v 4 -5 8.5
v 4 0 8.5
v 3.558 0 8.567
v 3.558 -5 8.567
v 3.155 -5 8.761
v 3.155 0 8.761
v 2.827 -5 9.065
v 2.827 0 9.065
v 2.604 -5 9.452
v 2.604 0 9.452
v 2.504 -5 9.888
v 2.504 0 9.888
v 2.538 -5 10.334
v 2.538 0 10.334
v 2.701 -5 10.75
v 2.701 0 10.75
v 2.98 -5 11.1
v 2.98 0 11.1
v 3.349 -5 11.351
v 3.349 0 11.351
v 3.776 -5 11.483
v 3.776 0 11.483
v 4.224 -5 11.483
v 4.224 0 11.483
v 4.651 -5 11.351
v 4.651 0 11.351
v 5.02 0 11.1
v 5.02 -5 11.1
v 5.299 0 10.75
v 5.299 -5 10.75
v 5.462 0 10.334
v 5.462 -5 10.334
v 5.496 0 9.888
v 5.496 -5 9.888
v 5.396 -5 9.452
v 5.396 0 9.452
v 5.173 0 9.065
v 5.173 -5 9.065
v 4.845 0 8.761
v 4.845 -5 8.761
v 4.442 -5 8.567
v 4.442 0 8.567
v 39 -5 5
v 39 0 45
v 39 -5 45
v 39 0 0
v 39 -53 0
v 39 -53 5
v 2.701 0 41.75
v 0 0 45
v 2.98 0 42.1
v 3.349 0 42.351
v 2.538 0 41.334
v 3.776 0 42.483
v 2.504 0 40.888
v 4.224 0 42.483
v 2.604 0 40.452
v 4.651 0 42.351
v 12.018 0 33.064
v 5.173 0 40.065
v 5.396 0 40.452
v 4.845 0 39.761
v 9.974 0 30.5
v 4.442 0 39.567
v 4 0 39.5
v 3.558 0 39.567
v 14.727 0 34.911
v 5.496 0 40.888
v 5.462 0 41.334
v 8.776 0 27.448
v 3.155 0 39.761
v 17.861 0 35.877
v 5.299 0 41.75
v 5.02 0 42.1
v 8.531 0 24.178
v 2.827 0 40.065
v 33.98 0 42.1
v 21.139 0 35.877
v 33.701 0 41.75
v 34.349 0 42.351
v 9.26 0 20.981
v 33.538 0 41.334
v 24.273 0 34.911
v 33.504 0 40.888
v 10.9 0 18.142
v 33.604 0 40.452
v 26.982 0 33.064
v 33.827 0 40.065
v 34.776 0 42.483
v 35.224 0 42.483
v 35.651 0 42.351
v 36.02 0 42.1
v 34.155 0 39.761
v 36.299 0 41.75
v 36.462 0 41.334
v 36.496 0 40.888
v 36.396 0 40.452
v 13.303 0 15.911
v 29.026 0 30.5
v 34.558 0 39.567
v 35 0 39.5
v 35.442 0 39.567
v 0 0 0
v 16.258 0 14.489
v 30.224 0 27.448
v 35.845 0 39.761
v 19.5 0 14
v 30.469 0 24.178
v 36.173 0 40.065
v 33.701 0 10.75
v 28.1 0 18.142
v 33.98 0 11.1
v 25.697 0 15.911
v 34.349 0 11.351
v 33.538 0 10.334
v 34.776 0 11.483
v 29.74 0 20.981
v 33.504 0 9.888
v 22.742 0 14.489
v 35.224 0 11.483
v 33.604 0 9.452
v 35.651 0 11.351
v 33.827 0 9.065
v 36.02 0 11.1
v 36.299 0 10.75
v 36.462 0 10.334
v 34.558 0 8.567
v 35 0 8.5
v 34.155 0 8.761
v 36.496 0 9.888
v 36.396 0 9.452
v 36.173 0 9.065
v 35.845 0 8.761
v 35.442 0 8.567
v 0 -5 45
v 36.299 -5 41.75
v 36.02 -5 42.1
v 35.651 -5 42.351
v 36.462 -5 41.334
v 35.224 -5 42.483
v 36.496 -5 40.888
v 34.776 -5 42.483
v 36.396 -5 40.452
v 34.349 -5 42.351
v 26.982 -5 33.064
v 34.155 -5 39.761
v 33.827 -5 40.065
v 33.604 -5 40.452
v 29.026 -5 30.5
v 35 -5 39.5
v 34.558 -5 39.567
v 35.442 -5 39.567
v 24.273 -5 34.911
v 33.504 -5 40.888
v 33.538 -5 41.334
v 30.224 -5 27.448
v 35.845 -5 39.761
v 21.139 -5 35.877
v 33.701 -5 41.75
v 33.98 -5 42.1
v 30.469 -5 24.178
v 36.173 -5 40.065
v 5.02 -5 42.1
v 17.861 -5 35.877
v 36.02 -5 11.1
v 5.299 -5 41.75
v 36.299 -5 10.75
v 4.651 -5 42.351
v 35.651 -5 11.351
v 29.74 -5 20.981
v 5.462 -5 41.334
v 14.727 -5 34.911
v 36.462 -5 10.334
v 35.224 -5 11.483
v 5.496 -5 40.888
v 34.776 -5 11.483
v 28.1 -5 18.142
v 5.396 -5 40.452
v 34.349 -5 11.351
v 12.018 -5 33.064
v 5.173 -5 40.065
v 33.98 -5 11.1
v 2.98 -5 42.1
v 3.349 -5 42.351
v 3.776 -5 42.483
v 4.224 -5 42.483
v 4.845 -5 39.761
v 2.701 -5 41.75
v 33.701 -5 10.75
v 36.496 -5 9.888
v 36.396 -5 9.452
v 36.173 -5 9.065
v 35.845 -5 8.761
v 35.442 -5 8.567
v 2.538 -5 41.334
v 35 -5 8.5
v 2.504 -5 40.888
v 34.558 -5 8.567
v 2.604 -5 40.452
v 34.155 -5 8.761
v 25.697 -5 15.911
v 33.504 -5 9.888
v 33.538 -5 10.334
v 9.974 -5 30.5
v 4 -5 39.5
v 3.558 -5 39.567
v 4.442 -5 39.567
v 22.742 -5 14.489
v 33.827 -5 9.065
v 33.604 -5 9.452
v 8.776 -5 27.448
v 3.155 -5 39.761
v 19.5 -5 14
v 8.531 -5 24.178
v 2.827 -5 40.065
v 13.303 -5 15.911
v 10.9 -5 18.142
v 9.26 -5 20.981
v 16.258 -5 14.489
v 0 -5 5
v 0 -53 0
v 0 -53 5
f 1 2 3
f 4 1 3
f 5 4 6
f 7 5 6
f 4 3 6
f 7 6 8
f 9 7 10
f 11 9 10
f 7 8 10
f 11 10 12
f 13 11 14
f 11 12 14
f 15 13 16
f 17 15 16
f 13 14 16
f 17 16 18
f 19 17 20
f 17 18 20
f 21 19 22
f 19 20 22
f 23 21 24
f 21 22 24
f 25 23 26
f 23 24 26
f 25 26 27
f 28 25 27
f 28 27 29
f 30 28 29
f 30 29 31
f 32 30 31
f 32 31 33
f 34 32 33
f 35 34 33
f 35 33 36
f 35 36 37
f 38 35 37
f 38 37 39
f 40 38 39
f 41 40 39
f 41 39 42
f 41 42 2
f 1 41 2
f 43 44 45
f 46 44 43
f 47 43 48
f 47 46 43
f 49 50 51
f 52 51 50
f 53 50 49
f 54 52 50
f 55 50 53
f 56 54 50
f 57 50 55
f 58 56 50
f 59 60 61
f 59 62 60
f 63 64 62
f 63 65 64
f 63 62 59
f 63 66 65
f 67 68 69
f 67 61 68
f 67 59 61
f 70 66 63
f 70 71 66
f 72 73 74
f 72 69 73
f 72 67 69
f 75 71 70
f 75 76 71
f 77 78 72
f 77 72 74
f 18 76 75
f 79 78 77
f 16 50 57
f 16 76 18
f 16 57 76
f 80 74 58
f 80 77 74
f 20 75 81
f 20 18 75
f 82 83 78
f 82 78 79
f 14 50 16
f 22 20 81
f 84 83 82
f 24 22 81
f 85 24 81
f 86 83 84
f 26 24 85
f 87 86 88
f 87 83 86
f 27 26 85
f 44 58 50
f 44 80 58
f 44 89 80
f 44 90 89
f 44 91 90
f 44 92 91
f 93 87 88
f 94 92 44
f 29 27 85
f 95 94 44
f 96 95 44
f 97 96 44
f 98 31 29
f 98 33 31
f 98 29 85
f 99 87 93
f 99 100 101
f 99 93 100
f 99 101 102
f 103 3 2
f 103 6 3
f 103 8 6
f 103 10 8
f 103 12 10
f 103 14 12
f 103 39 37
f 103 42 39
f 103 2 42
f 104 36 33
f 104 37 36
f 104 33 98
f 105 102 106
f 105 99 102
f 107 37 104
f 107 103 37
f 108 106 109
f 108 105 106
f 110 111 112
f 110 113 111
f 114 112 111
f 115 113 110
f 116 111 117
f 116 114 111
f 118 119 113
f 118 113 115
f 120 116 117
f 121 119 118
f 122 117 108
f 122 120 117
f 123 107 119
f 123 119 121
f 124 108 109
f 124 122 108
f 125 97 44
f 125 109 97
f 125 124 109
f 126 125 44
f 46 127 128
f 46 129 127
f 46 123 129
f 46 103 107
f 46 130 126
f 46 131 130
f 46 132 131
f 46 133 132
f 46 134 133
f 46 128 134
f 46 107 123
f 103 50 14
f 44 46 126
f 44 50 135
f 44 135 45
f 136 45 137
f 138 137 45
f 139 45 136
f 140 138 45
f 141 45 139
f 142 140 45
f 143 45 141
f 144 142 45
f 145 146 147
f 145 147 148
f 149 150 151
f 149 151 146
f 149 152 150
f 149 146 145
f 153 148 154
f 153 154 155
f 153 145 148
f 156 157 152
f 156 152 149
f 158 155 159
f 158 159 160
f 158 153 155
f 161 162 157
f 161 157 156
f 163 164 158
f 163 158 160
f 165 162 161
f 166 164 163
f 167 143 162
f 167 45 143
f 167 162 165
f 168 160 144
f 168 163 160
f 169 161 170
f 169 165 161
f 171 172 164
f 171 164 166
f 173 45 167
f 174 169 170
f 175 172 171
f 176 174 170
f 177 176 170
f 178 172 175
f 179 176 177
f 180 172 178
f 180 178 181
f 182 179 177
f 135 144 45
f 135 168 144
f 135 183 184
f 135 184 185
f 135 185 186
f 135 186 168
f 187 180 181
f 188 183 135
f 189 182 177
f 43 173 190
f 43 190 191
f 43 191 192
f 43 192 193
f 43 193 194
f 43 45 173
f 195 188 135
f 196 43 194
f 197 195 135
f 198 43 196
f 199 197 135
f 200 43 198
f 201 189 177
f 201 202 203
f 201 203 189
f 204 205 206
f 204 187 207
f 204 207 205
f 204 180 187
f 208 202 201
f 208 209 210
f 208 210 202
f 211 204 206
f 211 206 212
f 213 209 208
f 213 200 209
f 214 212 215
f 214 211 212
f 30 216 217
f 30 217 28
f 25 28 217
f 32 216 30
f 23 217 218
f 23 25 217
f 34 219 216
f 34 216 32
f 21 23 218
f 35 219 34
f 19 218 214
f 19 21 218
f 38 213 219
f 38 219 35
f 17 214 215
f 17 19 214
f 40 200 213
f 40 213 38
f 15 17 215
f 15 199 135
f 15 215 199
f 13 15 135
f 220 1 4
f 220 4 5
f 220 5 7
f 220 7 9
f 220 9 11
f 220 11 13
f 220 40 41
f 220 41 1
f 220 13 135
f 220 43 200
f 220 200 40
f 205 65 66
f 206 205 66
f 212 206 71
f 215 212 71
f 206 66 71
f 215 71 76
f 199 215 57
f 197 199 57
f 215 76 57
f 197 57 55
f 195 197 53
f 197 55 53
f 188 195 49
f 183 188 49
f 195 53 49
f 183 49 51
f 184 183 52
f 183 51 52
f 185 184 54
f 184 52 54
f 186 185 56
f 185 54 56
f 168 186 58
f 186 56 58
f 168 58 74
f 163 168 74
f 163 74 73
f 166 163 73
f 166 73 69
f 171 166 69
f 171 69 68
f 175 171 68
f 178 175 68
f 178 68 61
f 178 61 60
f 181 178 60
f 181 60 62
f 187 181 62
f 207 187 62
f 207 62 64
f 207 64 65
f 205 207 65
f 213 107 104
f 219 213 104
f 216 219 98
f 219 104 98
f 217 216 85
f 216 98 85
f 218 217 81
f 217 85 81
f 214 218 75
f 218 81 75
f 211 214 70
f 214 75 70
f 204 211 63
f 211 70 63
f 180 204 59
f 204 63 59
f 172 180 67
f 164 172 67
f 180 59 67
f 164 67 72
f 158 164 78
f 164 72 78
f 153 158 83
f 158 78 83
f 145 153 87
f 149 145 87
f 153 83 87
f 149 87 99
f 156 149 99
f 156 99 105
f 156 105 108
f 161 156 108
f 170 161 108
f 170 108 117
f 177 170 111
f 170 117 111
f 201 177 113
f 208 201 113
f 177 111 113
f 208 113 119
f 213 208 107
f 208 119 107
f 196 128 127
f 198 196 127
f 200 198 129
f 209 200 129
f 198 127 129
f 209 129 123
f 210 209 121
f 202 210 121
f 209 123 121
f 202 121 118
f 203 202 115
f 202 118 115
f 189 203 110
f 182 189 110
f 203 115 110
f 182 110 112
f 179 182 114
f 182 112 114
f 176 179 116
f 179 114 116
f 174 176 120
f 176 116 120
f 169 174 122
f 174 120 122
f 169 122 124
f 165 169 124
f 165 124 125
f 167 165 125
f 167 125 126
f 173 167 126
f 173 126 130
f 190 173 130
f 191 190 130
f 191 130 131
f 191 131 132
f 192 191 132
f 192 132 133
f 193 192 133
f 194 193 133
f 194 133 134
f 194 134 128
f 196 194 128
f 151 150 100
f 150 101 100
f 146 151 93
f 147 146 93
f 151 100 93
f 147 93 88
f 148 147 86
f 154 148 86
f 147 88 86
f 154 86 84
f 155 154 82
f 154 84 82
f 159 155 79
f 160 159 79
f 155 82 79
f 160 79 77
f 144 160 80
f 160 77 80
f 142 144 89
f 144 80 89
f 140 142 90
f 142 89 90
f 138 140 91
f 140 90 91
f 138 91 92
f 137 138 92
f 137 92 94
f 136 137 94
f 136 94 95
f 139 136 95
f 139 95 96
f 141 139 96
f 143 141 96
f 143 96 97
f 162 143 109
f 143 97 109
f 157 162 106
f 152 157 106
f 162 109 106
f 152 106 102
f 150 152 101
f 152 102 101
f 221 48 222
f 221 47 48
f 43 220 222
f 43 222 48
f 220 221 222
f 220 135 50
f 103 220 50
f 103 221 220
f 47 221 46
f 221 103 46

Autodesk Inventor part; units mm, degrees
ref_plane "YZ Plane" through (0, 0, 0) normal (1, 0, 0) x (0, 1, 0)
ref_plane "XZ Plane" through (0, 0, 0) normal (0, 1, 0) x (-1, 0, 0)
ref_plane "XY Plane" through (0, 0, 0) normal (0, 0, 1) x (1, 0, 0)
sketch "Sketch1" plane through (0, 0, 0) normal (0, 0, 1) x (1, 0, 0)
  line L0 (0, 0) -> (39, 0)
  line L1 (39, 0) -> (39, -53)
  line L2 (39, -53) -> (0, -53)
  line L3 (0, -53) -> (0, 0)
  dimension "d0" = 39
  dimension "d1" = 53
extrude "Extrusion1" add sketch "Sketch1" along normal blind 5
sketch "Sketch2" plane through (0, 0, 5) normal (0, 0, 1) x (1, 0, 0)
  line L0 (39, 0) -> (0, 0) projected
  line L1 (39, -53) -> (39, 0) projected
  line L2 (0, 0) -> (39, 0)
  line L3 (39, 0) -> (39, -5)
  line L4 (39, -5) -> (0, -5)
  line L5 (0, -5) -> (0, 0)
  dimension "d4" = 5
extrude "Extrusion2" add sketch "Sketch2" along normal blind 40
sketch "Sketch3" plane through (0, -5, 5) normal (0, -1, 0) x (1, 0, 0)
  line L0 (0, 0) -> (0, 40) projected
  line L1 (0, 0) -> (39, 0) projected
  point P0 (0, -5)
  point P1 (19.5, 20)
  point P2 (4, 5)
  point P3 (4, 36)
  point P4 (35, 5)
  point P5 (35, 36)
  dimension "d7" = 19.5
  dimension "d8" = 20
  dimension "d9" = 5
  dimension "d10" = 4
  dimension "d13" = 31
  dimension "d16" = 31
hole "Hole1" at (19.5, -5, 25) direction (0, 1, 0) diameter 22 end through all
hole "Hole2" at (4, -5, 10) at (4, -5, 41) at (35, -5, 41) at (35, -5, 10) direction (0, 1, 0) diameter 3 end through all
properties part number "head-baseblate" material "Aluminum 6061"
